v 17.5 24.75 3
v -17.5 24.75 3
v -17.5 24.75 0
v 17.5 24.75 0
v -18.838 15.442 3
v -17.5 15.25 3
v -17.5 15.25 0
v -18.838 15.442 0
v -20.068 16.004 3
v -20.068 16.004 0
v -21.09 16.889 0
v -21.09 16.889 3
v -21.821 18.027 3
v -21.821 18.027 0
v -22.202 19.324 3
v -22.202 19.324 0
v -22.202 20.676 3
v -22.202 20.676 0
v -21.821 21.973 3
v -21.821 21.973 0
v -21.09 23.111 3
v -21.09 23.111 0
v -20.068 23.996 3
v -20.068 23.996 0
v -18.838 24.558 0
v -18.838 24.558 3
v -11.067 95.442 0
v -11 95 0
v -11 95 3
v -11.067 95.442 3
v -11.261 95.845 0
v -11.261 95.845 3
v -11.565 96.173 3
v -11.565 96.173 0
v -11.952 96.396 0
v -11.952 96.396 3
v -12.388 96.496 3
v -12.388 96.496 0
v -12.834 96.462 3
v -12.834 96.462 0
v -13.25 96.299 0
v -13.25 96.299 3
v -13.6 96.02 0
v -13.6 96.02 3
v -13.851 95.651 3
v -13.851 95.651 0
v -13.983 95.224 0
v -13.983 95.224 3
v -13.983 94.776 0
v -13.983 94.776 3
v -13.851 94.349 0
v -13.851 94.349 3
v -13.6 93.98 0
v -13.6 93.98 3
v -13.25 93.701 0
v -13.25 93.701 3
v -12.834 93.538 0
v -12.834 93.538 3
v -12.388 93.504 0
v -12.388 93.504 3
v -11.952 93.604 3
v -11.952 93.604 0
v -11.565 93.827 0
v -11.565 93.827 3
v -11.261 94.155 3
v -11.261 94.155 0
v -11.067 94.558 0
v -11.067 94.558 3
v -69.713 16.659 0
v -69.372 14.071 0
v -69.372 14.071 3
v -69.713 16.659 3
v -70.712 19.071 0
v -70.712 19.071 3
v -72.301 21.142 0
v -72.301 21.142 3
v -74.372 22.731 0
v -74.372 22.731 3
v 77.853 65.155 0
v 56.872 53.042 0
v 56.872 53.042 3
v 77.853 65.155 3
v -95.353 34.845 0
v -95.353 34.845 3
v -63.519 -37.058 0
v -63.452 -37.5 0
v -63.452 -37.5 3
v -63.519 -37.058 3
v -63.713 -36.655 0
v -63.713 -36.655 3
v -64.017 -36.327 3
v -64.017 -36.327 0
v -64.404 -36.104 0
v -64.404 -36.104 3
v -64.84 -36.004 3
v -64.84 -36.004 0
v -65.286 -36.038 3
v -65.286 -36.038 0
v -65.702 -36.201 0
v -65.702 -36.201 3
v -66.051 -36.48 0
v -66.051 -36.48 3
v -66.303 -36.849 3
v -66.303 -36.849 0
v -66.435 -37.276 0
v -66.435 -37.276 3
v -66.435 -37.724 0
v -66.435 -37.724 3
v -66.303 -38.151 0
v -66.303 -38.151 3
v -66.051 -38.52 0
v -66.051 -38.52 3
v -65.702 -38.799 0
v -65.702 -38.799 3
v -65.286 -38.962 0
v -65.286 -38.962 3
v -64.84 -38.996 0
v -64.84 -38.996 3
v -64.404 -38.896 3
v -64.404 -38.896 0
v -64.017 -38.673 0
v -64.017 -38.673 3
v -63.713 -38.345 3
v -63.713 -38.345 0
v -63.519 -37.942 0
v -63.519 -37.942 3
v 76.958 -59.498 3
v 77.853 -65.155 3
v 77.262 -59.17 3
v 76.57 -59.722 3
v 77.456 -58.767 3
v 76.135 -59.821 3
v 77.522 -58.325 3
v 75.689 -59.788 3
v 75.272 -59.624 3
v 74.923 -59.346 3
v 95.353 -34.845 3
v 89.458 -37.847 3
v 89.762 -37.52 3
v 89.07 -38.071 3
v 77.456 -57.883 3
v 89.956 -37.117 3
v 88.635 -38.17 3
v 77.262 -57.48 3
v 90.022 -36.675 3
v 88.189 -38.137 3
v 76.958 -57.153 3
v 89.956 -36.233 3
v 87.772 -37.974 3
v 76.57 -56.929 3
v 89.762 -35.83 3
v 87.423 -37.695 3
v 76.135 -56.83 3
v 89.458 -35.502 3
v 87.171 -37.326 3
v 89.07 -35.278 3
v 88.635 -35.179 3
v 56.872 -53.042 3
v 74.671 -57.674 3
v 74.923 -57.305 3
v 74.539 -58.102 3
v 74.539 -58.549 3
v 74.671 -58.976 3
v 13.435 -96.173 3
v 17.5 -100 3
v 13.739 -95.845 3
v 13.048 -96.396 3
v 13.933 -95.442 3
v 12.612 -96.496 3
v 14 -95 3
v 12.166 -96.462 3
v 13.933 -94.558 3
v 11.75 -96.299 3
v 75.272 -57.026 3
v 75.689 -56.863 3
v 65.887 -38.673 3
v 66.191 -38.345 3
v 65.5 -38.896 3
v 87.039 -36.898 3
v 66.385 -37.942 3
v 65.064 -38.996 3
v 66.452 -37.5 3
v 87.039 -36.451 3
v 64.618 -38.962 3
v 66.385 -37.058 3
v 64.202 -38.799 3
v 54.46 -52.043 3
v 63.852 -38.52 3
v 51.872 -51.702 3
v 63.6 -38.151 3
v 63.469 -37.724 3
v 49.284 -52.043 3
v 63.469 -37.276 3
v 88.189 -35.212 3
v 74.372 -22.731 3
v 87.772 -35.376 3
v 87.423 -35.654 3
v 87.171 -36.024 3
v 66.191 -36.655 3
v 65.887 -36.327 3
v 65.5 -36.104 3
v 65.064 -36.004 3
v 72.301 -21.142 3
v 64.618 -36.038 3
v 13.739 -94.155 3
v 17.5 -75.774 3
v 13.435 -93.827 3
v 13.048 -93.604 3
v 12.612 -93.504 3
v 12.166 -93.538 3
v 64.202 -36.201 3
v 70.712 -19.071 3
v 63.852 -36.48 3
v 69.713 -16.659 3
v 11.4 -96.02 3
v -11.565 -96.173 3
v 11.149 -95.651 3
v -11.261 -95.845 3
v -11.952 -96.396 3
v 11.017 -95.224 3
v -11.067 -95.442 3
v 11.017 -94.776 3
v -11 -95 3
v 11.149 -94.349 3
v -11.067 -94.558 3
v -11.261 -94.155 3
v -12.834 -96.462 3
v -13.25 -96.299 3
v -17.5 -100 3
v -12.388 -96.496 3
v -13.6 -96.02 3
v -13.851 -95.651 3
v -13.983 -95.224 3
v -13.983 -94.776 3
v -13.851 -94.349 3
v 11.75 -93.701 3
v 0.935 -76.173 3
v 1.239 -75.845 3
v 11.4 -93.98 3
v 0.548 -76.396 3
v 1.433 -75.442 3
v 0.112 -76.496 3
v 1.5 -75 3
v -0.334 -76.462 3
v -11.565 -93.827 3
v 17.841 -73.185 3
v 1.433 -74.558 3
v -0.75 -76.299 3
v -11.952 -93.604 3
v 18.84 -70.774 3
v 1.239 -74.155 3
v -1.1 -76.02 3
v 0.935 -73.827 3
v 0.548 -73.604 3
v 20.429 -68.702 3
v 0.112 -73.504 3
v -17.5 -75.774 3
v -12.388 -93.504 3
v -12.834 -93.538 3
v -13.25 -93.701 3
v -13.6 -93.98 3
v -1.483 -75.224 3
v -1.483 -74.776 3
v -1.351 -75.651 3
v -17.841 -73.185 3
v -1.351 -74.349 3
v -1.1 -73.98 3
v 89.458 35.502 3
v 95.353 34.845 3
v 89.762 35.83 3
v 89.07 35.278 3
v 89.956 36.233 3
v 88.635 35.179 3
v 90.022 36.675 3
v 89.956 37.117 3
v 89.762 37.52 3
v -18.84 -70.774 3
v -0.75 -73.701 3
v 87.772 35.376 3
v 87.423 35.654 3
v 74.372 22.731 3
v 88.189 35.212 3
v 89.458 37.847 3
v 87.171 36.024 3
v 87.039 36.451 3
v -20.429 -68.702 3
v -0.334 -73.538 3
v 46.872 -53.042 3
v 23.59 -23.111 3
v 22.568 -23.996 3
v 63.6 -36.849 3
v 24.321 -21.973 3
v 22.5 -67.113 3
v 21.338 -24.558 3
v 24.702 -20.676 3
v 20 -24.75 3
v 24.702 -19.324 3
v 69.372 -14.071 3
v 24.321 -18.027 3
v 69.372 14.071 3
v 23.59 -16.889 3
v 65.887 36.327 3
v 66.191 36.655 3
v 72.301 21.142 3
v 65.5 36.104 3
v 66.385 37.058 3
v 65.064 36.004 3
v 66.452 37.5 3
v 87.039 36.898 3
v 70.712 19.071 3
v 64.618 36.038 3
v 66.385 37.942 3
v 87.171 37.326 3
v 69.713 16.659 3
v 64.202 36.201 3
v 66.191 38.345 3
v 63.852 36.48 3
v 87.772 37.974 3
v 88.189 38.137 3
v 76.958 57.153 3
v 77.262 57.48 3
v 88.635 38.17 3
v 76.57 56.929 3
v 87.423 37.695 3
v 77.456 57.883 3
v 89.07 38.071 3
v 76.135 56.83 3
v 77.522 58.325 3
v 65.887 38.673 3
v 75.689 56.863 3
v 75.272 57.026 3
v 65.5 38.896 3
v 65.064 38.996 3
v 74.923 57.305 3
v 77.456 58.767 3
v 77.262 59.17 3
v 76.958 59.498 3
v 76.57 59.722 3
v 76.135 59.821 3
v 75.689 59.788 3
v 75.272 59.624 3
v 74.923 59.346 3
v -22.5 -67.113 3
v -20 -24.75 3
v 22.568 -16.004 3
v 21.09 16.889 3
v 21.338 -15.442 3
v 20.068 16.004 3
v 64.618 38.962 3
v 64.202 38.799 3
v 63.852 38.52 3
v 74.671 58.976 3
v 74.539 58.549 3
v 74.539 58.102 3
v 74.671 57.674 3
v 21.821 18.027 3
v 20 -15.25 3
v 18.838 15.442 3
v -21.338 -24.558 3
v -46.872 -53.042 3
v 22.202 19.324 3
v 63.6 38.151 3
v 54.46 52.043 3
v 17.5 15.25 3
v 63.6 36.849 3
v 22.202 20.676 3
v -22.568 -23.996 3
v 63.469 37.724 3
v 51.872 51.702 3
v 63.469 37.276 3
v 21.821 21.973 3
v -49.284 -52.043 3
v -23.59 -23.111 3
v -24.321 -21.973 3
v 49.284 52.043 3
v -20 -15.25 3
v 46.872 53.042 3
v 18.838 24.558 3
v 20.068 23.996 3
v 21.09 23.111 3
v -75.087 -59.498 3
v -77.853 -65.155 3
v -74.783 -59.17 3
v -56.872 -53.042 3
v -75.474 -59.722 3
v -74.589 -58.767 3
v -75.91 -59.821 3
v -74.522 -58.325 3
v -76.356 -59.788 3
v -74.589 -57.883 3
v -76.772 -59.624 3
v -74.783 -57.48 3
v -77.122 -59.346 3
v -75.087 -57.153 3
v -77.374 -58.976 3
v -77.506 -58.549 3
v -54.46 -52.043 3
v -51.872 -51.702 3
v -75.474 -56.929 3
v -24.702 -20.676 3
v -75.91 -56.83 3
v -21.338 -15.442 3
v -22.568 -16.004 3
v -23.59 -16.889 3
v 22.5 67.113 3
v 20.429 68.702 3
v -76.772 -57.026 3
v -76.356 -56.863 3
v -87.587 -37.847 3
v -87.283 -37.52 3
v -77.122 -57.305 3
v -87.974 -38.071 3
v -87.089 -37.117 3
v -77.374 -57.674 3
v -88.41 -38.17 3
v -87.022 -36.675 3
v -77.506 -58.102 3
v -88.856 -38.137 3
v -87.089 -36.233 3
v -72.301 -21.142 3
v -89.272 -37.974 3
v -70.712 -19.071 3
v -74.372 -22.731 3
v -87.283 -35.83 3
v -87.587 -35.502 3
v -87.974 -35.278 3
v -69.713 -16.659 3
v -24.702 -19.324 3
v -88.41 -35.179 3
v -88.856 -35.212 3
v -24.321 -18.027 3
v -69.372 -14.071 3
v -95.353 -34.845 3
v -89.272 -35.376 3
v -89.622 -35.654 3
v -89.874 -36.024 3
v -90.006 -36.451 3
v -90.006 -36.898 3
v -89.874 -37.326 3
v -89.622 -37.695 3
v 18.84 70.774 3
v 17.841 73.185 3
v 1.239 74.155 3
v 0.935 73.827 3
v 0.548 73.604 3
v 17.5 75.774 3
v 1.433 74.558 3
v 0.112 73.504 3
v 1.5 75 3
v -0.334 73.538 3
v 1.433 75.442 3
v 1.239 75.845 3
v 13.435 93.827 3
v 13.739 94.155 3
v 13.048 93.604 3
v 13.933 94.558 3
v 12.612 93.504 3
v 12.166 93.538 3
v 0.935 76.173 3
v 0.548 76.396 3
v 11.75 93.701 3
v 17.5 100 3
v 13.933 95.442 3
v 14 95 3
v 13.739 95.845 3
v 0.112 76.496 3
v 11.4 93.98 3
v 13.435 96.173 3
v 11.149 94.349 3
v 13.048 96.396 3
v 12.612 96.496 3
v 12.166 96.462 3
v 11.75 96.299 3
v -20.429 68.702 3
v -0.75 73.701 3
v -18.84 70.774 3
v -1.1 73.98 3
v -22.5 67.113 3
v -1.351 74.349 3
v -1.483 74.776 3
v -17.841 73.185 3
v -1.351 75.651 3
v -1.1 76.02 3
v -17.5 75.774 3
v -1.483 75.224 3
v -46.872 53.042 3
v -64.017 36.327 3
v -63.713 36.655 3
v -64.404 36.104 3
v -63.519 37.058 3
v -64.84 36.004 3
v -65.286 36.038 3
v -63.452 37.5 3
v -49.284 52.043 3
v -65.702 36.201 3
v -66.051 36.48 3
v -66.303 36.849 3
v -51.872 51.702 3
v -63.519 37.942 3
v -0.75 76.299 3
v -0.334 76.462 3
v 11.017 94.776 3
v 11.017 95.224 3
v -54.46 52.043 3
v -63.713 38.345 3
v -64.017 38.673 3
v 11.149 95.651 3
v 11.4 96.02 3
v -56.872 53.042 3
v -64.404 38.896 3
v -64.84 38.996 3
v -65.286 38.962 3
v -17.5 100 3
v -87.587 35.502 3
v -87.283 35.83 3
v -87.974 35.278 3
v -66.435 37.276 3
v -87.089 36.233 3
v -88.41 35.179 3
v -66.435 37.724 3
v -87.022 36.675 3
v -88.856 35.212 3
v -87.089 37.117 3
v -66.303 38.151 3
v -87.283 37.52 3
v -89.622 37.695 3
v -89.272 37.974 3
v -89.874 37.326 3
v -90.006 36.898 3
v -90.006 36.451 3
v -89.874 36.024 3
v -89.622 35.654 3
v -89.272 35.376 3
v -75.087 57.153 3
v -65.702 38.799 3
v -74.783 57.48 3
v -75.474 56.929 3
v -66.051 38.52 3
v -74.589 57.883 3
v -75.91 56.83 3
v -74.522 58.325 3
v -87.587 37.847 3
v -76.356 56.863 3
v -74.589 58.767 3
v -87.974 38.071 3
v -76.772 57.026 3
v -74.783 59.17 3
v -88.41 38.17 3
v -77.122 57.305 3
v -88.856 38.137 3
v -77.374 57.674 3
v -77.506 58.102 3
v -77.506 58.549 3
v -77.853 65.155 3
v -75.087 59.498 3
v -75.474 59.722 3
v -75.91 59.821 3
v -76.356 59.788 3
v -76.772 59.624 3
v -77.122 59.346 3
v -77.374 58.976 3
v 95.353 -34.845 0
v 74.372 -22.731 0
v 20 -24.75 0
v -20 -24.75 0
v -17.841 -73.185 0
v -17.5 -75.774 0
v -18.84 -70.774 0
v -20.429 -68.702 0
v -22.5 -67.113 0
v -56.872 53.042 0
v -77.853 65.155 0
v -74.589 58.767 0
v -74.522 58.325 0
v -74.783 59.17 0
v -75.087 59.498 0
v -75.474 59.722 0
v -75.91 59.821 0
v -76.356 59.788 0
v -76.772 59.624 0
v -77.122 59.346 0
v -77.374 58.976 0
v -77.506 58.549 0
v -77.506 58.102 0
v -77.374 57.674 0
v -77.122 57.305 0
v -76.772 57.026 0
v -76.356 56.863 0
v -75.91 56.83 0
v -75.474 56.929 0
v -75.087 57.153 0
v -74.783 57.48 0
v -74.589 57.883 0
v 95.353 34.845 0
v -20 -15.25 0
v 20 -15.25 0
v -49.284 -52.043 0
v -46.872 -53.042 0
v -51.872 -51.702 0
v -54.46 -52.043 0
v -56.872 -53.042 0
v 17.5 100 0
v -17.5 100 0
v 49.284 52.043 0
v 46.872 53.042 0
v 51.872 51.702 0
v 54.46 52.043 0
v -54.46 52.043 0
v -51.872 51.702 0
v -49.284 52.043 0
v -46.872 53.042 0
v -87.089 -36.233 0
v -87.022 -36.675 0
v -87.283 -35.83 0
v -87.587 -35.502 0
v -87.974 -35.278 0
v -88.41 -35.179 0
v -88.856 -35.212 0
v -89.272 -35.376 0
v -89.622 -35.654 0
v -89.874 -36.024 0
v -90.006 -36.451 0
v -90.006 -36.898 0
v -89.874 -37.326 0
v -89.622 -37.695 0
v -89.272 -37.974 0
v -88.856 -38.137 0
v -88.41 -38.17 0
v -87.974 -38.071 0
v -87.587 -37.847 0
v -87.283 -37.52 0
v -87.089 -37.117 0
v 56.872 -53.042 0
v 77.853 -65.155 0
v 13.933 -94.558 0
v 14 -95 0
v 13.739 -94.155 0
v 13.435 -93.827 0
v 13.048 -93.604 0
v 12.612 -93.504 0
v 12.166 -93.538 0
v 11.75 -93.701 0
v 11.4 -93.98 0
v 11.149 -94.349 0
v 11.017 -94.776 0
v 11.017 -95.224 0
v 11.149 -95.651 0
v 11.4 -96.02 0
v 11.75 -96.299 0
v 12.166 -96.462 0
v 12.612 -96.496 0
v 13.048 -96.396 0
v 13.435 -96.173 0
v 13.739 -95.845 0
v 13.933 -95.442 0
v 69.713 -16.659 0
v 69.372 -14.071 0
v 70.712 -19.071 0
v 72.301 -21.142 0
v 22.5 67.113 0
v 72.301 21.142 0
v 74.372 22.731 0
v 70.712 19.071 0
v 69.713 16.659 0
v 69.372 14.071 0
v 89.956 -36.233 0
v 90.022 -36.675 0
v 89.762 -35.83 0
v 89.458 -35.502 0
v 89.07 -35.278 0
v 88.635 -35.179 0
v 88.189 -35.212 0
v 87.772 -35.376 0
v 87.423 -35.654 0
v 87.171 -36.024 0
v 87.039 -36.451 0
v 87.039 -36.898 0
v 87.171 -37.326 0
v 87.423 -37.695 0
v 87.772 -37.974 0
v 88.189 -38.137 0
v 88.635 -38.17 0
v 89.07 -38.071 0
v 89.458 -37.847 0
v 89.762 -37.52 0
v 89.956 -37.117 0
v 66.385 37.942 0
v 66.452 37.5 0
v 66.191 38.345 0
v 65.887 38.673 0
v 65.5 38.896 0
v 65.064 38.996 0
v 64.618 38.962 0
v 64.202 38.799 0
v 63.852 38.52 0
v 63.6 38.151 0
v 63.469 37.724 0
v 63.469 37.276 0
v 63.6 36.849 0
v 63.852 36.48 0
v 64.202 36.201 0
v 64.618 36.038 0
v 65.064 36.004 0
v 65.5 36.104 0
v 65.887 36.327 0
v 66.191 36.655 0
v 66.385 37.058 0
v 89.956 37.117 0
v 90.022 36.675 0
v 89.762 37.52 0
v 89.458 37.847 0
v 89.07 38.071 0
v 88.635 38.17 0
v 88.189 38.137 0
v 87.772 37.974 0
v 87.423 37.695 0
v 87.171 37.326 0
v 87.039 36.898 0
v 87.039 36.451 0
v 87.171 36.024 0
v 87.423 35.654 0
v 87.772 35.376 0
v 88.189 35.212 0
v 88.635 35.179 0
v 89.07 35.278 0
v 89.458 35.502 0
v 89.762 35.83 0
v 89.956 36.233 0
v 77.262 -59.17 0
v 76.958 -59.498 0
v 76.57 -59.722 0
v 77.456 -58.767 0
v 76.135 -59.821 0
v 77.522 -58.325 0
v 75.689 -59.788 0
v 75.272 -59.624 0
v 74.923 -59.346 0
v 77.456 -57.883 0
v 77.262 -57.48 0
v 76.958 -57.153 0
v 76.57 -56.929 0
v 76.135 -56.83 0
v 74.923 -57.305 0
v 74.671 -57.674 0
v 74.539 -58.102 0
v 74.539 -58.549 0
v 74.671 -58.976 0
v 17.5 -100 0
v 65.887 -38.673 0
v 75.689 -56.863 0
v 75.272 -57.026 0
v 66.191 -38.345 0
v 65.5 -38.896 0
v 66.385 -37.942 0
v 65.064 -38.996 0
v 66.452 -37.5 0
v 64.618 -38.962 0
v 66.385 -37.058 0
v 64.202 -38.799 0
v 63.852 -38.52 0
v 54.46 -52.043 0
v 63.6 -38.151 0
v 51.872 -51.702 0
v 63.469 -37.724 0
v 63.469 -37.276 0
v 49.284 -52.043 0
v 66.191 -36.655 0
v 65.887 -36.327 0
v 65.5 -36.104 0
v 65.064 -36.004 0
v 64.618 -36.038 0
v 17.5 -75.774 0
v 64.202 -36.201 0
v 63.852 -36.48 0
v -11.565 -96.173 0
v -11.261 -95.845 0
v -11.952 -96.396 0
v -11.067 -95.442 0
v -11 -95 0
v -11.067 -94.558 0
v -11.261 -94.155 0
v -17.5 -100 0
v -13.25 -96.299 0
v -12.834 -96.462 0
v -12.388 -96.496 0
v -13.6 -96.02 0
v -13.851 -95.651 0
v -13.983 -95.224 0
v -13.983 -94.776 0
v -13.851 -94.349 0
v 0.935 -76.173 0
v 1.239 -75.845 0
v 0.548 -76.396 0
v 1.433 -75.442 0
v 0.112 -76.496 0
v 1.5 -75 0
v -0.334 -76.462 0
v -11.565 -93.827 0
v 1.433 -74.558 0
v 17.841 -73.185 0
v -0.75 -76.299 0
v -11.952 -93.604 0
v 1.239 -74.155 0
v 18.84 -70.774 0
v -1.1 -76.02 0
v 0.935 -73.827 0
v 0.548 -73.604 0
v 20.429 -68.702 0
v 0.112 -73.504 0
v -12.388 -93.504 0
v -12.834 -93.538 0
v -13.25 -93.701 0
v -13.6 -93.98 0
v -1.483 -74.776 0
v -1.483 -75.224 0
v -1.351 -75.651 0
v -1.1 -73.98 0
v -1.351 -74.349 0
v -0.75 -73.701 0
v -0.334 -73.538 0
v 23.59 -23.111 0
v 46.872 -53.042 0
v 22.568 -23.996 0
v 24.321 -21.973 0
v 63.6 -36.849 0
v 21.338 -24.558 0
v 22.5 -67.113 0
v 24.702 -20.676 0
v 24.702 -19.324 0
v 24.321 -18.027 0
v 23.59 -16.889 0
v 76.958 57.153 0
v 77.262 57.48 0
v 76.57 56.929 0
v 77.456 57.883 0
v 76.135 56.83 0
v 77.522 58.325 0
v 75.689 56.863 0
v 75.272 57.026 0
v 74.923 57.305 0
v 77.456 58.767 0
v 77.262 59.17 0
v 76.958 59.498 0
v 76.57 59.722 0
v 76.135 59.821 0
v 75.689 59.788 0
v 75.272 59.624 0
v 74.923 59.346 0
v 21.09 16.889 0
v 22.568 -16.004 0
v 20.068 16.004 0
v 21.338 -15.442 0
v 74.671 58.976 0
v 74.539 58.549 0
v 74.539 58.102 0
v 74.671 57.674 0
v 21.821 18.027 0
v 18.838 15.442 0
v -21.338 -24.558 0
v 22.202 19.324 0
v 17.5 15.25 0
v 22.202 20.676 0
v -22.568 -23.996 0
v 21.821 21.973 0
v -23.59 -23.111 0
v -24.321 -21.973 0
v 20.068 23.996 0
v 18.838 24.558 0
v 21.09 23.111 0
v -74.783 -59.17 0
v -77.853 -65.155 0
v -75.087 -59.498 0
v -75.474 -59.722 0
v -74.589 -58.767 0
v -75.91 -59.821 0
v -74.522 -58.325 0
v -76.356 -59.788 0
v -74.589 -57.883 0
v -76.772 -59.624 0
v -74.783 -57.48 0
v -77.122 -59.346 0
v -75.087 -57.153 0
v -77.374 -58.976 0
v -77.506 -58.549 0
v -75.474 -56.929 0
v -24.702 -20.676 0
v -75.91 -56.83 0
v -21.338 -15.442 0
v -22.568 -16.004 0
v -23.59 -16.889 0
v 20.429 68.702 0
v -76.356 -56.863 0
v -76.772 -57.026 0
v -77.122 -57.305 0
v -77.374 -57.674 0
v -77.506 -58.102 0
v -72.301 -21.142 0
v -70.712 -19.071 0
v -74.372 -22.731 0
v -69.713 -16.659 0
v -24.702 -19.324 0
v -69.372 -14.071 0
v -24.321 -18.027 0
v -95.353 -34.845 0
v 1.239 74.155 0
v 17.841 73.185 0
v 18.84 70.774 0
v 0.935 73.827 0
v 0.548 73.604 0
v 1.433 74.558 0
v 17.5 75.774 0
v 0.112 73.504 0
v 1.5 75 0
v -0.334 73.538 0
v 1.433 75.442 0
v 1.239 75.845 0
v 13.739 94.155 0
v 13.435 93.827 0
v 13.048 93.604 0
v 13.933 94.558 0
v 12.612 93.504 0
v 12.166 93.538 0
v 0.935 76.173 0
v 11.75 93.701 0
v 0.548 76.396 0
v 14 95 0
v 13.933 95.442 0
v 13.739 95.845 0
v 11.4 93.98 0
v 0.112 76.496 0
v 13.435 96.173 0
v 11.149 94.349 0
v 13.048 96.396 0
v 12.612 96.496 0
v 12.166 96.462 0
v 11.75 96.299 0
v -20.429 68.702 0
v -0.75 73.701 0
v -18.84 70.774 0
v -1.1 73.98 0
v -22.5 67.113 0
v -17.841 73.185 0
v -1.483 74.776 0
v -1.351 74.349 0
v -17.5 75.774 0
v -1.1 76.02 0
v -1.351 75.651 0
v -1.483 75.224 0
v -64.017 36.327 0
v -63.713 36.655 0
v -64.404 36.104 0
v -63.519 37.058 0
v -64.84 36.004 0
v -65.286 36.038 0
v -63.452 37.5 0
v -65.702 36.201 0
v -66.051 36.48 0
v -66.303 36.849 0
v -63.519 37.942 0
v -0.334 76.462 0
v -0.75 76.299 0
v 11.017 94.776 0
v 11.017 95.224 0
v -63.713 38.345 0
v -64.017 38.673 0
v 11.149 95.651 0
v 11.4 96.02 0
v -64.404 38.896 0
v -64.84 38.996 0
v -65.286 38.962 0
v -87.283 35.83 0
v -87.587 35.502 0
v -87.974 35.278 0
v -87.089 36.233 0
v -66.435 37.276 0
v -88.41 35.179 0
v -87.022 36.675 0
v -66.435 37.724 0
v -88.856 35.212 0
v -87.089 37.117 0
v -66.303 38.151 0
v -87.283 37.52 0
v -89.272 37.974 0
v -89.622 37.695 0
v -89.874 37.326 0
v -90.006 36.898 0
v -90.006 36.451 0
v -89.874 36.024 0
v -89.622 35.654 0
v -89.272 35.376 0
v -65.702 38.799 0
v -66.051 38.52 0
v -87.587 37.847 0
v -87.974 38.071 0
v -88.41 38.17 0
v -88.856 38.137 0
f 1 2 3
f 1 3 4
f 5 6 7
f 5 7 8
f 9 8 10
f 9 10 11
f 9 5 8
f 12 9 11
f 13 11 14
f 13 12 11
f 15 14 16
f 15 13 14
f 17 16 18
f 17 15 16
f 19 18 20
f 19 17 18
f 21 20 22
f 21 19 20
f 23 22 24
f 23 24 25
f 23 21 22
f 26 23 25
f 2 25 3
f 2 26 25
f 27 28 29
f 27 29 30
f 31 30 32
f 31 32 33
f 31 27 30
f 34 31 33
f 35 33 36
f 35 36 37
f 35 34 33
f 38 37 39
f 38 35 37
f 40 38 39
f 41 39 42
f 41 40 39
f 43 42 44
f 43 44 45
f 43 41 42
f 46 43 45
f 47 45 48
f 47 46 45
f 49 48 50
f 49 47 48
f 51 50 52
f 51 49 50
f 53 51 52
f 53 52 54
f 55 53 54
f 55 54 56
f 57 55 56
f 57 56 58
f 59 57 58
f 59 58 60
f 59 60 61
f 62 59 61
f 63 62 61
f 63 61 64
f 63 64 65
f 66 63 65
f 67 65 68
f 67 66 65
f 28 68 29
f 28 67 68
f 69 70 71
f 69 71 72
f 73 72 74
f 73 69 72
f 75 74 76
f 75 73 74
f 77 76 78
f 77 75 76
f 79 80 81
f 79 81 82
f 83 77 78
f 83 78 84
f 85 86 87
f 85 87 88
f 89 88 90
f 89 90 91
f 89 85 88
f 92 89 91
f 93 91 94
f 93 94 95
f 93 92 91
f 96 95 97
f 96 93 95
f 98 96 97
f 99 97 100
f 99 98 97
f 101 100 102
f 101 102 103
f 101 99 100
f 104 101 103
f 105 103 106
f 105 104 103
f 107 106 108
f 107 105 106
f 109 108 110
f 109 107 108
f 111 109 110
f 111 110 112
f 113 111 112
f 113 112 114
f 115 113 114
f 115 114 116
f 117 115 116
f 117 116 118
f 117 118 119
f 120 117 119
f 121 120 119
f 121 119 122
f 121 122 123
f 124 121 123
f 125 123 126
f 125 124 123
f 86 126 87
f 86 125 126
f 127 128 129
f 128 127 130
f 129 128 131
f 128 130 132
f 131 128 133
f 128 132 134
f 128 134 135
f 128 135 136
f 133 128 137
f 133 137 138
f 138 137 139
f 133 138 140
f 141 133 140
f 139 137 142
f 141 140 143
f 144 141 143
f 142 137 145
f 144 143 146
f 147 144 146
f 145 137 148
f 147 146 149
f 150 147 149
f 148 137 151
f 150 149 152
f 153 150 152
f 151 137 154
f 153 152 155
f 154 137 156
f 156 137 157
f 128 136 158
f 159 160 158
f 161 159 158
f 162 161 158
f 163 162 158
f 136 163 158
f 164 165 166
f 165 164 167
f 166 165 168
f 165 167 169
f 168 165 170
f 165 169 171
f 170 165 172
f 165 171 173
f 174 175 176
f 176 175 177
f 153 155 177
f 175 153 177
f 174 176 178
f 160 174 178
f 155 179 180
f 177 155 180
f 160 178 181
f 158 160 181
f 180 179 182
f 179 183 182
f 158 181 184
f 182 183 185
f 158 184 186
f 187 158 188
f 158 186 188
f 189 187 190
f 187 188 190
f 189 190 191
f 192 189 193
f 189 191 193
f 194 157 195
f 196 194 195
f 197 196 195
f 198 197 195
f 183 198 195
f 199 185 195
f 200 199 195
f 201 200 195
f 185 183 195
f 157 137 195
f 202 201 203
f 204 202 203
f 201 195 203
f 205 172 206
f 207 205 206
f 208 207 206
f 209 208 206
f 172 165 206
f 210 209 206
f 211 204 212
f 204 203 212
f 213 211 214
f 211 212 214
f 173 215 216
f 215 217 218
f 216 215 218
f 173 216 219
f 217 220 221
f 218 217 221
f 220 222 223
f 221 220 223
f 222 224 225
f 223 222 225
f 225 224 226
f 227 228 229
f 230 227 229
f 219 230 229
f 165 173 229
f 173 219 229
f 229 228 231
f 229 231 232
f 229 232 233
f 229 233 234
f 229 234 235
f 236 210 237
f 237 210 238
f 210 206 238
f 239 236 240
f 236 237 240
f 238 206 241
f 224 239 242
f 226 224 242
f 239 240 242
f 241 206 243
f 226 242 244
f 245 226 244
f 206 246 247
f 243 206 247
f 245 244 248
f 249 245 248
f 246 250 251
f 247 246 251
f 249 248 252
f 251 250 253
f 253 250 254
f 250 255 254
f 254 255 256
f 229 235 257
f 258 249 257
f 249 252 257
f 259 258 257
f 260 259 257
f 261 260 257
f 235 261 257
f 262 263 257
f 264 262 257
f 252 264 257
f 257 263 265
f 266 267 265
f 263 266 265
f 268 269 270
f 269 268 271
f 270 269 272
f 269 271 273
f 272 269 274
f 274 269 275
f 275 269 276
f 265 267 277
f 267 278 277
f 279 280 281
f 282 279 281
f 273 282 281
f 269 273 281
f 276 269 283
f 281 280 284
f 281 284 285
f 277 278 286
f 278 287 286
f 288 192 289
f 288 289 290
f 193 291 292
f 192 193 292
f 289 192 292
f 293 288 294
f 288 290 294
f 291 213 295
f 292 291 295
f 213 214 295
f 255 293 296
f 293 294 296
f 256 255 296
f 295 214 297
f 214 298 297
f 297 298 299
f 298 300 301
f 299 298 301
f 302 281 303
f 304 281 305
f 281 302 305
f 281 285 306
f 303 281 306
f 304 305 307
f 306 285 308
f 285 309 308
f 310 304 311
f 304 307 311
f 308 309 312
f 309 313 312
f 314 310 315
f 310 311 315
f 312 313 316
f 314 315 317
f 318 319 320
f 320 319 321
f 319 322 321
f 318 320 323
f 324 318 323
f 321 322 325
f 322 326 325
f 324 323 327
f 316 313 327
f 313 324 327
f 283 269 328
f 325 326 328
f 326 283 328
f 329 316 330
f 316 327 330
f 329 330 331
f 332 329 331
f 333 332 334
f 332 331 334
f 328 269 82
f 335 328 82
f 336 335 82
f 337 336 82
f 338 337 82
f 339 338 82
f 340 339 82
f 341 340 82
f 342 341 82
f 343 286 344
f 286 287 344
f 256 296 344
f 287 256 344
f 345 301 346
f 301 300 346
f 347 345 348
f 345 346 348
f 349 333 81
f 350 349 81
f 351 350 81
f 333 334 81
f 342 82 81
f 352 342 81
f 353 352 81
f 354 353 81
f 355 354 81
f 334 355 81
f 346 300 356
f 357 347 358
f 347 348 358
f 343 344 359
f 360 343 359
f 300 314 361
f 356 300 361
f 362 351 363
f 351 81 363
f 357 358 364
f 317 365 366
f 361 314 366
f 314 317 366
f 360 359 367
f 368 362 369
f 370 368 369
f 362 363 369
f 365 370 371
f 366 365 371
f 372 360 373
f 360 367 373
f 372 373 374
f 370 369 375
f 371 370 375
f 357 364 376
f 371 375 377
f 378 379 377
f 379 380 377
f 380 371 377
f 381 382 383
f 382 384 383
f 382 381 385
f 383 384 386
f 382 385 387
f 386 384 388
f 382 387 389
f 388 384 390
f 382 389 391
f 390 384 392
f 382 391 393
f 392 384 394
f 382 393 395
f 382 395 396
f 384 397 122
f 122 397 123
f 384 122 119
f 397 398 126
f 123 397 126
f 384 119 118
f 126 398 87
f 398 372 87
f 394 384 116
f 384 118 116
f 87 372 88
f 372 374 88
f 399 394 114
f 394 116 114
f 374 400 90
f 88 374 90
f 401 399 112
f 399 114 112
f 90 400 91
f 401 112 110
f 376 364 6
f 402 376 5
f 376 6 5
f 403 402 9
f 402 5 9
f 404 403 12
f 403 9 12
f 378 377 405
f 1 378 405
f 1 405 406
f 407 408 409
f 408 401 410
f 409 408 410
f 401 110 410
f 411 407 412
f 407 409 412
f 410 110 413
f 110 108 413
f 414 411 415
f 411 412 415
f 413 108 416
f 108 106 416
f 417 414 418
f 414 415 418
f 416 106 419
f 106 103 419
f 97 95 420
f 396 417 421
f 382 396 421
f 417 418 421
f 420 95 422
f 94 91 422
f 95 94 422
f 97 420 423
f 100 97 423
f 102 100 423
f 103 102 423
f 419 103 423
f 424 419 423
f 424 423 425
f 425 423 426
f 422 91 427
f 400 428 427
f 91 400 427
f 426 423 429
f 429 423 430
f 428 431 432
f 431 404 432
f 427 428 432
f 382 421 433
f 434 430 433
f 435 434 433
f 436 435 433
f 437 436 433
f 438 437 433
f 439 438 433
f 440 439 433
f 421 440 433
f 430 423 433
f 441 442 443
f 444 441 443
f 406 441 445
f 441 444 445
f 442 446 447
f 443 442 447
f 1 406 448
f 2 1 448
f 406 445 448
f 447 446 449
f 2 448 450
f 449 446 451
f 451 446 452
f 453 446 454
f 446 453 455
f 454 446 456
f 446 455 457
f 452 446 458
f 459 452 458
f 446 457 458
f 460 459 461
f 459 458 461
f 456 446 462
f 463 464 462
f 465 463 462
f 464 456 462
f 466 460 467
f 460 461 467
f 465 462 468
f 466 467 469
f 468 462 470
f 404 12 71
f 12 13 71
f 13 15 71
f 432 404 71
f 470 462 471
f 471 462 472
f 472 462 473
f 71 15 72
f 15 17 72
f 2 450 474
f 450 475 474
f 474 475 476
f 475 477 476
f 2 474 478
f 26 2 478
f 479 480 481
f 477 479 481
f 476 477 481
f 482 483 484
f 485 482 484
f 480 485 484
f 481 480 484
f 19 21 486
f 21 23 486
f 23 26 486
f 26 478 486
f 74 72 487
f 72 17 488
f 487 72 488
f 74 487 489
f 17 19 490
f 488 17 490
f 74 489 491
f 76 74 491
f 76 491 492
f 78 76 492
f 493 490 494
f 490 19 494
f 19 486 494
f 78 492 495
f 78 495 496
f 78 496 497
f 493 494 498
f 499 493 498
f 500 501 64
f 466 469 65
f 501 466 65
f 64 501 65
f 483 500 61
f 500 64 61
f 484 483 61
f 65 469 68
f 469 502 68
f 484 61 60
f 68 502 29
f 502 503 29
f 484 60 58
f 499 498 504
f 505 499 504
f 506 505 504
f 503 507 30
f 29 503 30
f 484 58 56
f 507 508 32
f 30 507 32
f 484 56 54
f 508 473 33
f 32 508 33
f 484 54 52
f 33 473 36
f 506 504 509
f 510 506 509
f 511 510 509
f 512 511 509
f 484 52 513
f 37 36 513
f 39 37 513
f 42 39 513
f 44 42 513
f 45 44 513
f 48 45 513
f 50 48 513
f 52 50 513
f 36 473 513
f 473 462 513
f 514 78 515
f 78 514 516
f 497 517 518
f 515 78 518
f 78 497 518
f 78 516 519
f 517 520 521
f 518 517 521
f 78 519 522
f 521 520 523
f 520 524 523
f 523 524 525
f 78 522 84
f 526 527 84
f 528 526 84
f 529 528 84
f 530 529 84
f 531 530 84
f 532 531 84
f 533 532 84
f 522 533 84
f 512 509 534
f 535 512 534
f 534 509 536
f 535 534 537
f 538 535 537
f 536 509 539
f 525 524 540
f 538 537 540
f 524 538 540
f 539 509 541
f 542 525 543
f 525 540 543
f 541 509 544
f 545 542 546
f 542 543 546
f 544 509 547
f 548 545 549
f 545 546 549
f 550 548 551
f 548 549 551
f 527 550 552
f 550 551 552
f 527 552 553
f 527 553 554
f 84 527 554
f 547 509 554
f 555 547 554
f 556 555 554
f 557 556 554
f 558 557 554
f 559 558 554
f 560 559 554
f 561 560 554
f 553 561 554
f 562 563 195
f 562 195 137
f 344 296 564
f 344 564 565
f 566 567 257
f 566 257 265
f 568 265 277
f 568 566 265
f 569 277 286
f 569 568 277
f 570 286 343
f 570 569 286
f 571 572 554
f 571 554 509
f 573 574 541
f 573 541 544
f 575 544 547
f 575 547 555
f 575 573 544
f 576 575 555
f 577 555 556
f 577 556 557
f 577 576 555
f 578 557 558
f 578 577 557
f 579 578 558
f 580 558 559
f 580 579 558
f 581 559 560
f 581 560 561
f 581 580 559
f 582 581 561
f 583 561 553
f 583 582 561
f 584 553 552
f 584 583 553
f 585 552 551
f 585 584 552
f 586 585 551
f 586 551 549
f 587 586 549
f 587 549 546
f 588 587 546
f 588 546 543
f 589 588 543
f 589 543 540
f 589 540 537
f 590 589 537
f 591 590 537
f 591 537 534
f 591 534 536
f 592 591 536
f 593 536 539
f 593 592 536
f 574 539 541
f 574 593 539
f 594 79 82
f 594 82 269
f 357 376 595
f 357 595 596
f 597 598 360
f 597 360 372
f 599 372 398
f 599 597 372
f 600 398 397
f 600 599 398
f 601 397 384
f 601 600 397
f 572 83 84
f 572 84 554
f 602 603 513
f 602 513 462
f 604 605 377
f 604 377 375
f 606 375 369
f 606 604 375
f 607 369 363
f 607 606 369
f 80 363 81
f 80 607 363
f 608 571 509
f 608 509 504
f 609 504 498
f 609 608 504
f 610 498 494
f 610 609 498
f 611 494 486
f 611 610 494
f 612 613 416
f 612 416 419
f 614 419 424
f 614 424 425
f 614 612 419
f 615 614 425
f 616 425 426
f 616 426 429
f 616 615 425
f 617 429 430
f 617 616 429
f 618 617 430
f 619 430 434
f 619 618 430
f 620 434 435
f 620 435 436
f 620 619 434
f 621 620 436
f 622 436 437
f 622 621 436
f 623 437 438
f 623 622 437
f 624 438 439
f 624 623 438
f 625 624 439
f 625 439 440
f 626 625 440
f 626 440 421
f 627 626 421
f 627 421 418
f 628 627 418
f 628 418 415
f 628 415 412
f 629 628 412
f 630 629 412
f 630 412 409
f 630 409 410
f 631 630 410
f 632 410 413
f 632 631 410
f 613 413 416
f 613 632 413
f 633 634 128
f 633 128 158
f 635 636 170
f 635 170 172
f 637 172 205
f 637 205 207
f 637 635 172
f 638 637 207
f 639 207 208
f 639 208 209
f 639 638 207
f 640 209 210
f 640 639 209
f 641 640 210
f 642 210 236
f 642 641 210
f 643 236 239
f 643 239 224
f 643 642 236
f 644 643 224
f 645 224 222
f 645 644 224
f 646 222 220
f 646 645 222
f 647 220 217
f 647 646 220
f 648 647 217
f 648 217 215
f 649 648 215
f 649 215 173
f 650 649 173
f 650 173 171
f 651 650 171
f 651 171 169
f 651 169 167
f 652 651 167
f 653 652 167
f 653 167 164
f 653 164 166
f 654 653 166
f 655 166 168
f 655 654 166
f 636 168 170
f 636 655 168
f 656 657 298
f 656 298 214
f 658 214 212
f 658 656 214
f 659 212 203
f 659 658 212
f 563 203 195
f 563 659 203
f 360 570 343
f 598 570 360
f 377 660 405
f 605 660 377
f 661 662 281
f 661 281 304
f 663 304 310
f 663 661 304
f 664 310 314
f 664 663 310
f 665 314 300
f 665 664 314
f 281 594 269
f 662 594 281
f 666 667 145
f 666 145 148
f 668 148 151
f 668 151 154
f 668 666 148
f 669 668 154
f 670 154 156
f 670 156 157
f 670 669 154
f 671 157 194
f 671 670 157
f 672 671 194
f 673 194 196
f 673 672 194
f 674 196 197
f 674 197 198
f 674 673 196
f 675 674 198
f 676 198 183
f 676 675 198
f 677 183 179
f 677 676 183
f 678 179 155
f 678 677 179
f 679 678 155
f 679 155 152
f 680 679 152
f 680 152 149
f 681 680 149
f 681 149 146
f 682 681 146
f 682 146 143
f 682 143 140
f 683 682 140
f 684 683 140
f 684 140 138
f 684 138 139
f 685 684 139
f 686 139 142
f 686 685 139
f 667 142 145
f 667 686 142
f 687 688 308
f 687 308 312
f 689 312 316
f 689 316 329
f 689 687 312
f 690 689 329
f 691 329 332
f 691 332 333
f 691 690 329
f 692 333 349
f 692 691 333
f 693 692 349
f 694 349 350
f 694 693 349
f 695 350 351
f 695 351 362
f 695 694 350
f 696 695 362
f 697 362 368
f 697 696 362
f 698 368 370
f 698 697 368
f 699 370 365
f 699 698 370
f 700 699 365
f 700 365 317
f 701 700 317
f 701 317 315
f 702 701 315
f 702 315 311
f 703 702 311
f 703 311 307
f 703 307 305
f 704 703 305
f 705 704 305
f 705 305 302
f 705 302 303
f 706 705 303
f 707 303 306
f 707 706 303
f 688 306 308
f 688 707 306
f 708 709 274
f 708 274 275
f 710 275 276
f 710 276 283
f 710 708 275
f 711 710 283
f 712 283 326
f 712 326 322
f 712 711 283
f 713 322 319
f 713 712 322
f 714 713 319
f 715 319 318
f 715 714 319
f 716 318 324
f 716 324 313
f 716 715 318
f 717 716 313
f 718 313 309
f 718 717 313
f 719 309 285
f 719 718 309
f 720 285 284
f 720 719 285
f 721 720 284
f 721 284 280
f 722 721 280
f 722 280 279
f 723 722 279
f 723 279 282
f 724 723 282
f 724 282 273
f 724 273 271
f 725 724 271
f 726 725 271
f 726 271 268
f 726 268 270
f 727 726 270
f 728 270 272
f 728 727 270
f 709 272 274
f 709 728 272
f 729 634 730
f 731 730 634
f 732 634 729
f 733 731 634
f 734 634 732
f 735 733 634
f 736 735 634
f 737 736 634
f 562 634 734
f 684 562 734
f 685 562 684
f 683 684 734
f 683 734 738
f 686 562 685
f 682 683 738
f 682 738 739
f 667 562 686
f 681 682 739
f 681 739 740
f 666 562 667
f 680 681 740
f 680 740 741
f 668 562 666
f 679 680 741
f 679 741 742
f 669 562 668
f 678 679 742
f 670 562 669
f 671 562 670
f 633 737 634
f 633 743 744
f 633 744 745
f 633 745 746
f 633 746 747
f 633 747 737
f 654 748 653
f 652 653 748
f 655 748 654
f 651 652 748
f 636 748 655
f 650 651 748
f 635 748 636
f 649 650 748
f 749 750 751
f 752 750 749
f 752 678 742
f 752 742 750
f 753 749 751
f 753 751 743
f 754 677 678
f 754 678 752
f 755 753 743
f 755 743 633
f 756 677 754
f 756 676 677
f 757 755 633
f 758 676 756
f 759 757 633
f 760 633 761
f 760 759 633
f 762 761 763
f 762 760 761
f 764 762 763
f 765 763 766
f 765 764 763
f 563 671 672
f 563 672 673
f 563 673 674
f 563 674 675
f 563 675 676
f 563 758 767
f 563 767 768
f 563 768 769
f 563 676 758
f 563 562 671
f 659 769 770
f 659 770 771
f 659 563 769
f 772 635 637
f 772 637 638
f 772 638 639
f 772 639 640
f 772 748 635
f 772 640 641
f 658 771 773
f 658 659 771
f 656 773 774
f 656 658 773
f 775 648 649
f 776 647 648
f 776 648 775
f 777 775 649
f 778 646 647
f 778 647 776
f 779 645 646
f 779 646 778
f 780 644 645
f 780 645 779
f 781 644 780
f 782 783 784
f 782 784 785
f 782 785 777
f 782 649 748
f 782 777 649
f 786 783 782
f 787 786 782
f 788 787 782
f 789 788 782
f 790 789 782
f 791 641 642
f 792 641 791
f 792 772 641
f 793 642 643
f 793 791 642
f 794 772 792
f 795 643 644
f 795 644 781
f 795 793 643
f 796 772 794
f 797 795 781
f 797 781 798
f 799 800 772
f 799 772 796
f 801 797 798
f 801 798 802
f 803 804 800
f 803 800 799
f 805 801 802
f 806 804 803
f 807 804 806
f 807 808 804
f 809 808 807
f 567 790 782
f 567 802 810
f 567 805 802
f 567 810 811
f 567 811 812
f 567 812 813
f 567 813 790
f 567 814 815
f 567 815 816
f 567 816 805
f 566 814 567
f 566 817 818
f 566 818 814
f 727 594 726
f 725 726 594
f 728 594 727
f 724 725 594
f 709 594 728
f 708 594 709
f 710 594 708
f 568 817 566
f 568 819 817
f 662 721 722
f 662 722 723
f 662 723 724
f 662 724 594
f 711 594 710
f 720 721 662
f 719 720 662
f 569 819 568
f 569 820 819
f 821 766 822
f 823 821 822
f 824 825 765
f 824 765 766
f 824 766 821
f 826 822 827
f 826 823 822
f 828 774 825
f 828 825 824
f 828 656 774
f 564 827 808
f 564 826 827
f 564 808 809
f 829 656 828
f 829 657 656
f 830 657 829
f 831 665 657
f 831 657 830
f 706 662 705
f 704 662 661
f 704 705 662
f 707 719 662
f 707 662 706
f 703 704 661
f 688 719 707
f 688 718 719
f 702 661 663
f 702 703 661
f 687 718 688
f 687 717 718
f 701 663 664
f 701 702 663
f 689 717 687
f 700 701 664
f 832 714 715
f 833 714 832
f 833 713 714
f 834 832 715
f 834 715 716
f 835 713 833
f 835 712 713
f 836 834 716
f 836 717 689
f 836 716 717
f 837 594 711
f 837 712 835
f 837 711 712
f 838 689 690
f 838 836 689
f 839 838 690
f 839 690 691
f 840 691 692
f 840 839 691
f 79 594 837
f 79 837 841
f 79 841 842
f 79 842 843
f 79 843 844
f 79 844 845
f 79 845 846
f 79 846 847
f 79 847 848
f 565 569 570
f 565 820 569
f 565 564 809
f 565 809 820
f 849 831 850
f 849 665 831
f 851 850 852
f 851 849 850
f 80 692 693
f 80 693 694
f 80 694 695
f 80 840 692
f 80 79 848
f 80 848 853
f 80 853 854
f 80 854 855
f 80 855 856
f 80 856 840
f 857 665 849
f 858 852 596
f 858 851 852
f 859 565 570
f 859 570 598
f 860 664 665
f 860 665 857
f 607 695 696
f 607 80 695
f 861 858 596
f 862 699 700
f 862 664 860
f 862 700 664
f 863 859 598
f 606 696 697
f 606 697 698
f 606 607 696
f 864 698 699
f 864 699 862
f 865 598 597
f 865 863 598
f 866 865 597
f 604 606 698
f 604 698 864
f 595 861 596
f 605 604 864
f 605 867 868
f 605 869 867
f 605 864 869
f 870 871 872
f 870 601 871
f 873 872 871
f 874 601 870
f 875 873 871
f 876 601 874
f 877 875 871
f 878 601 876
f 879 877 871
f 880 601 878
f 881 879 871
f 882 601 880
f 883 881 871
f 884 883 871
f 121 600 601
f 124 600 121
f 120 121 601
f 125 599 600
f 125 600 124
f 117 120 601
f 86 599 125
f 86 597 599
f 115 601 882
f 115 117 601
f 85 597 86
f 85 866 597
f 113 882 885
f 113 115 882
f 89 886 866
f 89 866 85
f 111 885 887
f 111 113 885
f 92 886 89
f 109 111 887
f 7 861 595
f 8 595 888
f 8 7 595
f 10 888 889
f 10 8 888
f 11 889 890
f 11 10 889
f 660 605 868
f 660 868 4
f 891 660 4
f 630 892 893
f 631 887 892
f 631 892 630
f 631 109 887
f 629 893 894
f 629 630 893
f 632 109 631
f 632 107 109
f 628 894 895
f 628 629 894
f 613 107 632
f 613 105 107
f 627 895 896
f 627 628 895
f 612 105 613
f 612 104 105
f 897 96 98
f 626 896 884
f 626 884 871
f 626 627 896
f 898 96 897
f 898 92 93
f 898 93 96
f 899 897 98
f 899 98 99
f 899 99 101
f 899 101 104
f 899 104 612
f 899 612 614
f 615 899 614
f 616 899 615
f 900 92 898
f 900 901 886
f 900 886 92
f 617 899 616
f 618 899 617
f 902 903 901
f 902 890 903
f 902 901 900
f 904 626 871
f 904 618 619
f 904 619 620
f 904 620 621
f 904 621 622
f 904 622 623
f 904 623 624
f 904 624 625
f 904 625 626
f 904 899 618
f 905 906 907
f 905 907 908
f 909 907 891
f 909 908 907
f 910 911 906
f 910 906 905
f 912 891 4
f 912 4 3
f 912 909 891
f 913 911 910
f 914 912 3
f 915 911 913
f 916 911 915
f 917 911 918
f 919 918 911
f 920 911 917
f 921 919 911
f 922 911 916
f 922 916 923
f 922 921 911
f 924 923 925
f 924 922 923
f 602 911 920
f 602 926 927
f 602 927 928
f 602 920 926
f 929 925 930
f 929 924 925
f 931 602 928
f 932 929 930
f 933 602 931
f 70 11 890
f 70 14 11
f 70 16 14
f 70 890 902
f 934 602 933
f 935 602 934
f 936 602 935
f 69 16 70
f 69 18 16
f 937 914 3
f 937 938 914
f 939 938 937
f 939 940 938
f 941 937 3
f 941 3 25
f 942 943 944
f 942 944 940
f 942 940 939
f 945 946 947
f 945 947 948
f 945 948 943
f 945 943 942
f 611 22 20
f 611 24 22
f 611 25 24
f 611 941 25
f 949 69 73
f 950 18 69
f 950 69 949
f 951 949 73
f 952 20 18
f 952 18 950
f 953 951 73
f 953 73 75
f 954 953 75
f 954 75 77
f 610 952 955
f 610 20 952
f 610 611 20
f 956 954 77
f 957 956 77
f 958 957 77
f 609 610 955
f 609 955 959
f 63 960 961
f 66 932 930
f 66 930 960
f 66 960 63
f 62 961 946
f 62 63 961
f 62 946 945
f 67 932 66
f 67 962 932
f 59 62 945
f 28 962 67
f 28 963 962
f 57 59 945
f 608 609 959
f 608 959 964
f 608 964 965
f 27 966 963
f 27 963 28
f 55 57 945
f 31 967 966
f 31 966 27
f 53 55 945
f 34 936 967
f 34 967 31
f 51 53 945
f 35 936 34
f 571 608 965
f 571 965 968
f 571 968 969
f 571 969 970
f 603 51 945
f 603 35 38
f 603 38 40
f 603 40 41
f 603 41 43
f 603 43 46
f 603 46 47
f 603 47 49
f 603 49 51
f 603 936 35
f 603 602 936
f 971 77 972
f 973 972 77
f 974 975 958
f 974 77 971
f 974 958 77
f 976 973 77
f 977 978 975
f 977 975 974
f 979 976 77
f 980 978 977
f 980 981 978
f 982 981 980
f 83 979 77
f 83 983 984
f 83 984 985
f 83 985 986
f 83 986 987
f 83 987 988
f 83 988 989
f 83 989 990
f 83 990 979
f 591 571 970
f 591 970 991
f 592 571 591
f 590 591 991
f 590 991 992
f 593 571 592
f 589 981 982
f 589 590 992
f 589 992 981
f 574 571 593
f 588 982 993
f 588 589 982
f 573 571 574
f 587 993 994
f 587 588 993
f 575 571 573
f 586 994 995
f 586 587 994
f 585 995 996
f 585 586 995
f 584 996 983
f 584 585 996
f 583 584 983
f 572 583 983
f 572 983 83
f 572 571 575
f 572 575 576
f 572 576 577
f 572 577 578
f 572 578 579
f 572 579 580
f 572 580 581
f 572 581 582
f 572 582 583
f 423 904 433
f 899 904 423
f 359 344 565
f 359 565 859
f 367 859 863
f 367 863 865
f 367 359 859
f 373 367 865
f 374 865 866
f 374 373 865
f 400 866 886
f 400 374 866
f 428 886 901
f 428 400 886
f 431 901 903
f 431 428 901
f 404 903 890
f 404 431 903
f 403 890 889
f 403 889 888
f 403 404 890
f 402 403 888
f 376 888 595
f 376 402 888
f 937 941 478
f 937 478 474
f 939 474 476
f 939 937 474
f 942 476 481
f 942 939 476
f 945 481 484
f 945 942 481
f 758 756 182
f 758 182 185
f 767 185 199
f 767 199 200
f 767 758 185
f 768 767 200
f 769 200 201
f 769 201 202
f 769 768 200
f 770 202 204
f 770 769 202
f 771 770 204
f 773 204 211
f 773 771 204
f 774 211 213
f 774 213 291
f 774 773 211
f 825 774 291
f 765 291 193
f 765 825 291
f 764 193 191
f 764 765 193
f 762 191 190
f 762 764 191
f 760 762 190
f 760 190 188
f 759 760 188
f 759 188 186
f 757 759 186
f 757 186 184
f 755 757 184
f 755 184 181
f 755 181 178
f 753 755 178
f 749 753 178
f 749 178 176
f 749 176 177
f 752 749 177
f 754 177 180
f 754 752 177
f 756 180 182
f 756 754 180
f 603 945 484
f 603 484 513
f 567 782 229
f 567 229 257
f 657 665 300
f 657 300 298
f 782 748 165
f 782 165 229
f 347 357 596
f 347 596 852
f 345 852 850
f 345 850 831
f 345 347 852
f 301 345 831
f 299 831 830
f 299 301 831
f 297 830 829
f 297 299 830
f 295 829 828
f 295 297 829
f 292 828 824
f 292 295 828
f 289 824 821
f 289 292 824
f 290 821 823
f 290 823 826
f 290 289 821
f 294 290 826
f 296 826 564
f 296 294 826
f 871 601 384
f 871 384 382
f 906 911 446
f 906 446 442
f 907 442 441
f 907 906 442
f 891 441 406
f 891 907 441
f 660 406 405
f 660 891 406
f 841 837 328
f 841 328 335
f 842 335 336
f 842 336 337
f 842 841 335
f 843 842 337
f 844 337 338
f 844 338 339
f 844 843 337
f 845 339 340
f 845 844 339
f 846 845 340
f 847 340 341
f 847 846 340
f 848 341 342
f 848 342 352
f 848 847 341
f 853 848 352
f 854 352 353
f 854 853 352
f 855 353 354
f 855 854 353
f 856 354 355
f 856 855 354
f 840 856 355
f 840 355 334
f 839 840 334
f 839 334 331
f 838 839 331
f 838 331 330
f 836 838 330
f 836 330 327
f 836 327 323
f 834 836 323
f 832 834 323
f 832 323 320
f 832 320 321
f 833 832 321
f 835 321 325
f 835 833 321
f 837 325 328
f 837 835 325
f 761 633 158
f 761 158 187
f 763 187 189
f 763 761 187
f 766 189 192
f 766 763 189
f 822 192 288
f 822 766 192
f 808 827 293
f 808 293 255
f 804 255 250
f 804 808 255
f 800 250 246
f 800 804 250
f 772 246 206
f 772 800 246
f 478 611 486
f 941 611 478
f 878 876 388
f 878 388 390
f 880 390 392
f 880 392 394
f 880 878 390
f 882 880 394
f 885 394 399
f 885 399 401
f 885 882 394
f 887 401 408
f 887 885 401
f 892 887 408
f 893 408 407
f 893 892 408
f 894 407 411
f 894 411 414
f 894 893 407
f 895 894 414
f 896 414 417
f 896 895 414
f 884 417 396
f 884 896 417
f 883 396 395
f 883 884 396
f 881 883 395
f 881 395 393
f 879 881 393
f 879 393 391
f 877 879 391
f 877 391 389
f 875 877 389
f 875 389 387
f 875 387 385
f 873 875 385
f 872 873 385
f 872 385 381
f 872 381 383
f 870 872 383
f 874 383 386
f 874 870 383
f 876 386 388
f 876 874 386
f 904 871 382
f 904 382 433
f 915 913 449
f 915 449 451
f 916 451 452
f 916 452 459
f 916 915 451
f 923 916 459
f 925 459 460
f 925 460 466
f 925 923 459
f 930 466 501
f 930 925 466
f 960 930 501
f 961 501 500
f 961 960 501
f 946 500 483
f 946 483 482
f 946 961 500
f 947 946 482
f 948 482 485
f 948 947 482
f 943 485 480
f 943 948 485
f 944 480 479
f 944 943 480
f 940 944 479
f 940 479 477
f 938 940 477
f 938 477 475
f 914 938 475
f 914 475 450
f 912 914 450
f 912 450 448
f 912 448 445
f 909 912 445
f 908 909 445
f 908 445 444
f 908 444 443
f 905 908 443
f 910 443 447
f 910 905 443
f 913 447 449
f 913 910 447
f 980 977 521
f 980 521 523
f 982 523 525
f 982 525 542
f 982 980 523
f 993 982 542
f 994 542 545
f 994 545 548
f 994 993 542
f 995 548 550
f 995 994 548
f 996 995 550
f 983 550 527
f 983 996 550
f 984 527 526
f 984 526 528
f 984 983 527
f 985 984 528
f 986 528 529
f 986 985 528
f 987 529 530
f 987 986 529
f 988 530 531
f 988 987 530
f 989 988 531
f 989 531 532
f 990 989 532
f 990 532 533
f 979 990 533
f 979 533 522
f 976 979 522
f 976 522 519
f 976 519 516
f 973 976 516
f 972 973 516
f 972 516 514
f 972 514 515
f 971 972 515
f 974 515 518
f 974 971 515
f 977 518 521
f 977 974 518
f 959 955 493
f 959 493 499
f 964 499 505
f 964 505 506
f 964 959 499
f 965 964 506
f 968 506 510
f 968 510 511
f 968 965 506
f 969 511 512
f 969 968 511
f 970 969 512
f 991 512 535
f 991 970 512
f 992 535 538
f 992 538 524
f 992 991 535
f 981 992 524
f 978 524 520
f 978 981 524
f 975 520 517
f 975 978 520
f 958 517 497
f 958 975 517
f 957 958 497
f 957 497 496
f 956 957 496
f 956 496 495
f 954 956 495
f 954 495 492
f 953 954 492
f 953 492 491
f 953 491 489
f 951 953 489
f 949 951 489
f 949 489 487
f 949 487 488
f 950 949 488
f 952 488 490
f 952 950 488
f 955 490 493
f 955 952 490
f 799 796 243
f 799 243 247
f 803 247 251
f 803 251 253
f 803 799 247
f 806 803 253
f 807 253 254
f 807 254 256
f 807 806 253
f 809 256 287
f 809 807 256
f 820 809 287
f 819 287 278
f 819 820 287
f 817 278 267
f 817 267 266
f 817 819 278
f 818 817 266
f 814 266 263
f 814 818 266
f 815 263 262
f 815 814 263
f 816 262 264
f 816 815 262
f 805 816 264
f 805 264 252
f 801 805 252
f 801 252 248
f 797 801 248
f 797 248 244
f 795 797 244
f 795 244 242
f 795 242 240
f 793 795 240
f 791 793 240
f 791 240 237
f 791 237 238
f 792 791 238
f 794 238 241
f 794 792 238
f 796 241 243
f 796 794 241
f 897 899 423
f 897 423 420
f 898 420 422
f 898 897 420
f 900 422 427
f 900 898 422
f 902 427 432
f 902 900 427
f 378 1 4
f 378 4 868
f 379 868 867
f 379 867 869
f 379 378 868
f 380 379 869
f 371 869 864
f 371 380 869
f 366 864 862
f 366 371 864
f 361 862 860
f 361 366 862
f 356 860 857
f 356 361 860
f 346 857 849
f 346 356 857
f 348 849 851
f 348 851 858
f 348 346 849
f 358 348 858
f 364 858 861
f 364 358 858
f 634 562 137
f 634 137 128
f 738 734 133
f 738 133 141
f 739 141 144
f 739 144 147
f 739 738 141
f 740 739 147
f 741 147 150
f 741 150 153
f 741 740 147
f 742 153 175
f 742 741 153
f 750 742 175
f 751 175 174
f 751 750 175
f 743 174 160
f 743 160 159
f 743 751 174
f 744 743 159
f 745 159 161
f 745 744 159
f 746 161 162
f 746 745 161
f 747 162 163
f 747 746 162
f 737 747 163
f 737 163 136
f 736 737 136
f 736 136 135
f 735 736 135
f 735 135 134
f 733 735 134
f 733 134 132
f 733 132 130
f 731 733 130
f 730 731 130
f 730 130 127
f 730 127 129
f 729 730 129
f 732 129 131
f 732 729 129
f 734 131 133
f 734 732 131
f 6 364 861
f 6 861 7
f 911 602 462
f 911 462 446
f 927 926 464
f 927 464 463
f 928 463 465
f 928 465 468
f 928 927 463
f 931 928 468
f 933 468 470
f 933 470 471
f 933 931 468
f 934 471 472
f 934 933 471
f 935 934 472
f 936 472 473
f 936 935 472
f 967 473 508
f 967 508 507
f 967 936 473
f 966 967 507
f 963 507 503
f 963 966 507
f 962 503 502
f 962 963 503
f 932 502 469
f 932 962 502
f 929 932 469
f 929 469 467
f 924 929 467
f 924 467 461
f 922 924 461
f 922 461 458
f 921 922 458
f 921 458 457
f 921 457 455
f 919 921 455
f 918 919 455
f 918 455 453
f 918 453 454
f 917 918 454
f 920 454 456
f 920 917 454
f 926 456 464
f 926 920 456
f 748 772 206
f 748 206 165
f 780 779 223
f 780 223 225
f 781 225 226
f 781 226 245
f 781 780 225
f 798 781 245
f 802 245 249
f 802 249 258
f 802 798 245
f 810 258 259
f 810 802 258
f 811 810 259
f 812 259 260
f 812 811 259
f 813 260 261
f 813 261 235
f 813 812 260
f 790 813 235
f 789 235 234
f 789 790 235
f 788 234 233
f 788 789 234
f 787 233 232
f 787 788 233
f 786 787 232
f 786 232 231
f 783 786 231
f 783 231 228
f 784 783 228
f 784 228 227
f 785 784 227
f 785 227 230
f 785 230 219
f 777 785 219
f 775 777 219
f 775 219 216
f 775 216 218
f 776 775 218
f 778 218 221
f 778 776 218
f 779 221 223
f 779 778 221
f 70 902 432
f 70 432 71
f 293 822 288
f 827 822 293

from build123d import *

# Parameters (mm, degrees)
IZIM1_R                     = 1.5
Y_KSEKLIK_EKSTR_ZYON1_DEPTH = 3
KES_EKSTR_ZYON2_DEPTH       = 3


with BuildPart() as part:
    # Çizim1 → Yükseklik-Ekstrüzyon1 (new body)
    with BuildSketch(Plane.XY):
        with BuildLine():
            Line((-17.5, 100), (17.5, 100))
            Line((17.5, 100), (17.5, 75.773502692))
            ThreePointArc((17.5, 75.773502692), (18.839745962, 70.773502692), (22.5, 67.113248654))
            Line((22.5, 67.113248654), (46.871778265, 53.042195912))
            ThreePointArc((46.871778265, 53.042195912), (51.871778265, 51.70244995), (56.871778265, 53.042195912))
            Line((56.871778265, 53.042195912), (77.852540378, 65.155444566))
            Line((77.852540378, 65.155444566), (95.352540378, 34.844555434))
            Line((95.352540378, 34.844555434), (74.371778265, 22.73130678))
            ThreePointArc((74.371778265, 22.73130678), (70.711524227, 19.071052742), (69.371778265, 14.071052742))
            Line((69.371778265, 14.071052742), (69.371778265, -14.071052742))
            ThreePointArc((69.371778265, -14.071052742), (70.711524227, -19.071052742), (74.371778265, -22.73130678))
            Line((74.371778265, -22.73130678), (95.352540378, -34.844555434))
            Line((95.352540378, -34.844555434), (77.852540378, -65.155444566))
            Line((77.852540378, -65.155444566), (56.871778265, -53.042195912))
            ThreePointArc((56.871778265, -53.042195912), (51.871778265, -51.70244995), (46.871778265, -53.042195912))
            Line((46.871778265, -53.042195912), (22.5, -67.113248654))
            ThreePointArc((22.5, -67.113248654), (18.839745962, -70.773502692), (17.5, -75.773502692))
            Line((17.5, -75.773502692), (17.5, -100))
            Line((17.5, -100), (-17.5, -100))
            Line((-17.5, -100), (-17.5, -75.773502692))
            ThreePointArc((-17.5, -75.773502692), (-18.839745962, -70.773502692), (-22.5, -67.113248654))
            Line((-22.5, -67.113248654), (-46.871778265, -53.042195912))
            ThreePointArc((-46.871778265, -53.042195912), (-51.871778265, -51.70244995), (-56.871778265, -53.042195912))
            Line((-56.871778265, -53.042195912), (-77.852540379, -65.155444566))
            Line((-77.852540379, -65.155444566), (-95.352540379, -34.844555434))
            Line((-95.352540379, -34.844555434), (-74.371778265, -22.73130678))
            ThreePointArc((-74.371778265, -22.73130678), (-70.711524227, -19.071052742), (-69.371778265, -14.071052742))
            Line((-69.371778265, -14.071052742), (-69.371778265, 14.071052742))
            ThreePointArc((-69.371778265, 14.071052742), (-70.711524227, 19.071052742), (-74.371778265, 22.73130678))
            Line((-74.371778265, 22.73130678), (-95.352540378, 34.844555434))
            Line((-95.352540378, 34.844555434), (-77.852540378, 65.155444566))
            Line((-77.852540378, 65.155444566), (-56.871778265, 53.042195912))
            ThreePointArc((-56.871778265, 53.042195912), (-51.871778265, 51.70244995), (-46.871778265, 53.042195912))
            Line((-46.871778265, 53.042195912), (-22.5, 67.113248654))
            ThreePointArc((-22.5, 67.113248654), (-18.839745962, 70.773502692), (-17.5, 75.773502692))
            Line((-17.5, 75.773502692), (-17.5, 100))
        make_face()
        with Locations((-12.5, 95)):
            Circle(IZIM1_R, mode=Mode.SUBTRACT)
        with Locations((12.5, 95)):
            Circle(IZIM1_R, mode=Mode.SUBTRACT)
        with Locations((0, 75)):
            Circle(IZIM1_R, mode=Mode.SUBTRACT)
        with Locations((76.022413359, 58.325317547)):
            Circle(IZIM1_R, mode=Mode.SUBTRACT)
        with Locations((88.522413359, 36.674682453)):
            Circle(IZIM1_R, mode=Mode.SUBTRACT)
        with Locations((64.951905284, 37.5)):
            Circle(IZIM1_R, mode=Mode.SUBTRACT)
        with Locations((88.522413359, -36.674682453)):
            Circle(IZIM1_R, mode=Mode.SUBTRACT)
        with Locations((76.02241336, -58.325317547)):
            Circle(IZIM1_R, mode=Mode.SUBTRACT)
        with Locations((64.951905284, -37.5)):
            Circle(IZIM1_R, mode=Mode.SUBTRACT)
        with Locations((12.5, -95)):
            Circle(IZIM1_R, mode=Mode.SUBTRACT)
        with Locations((-12.5, -95)):
            Circle(IZIM1_R, mode=Mode.SUBTRACT)
        with Locations((0, -75)):
            Circle(IZIM1_R, mode=Mode.SUBTRACT)
        with Locations((-76.022413359, -58.325317547)):
            Circle(IZIM1_R, mode=Mode.SUBTRACT)
        with Locations((-88.522413359, -36.674682453)):
            Circle(IZIM1_R, mode=Mode.SUBTRACT)
        with Locations((-64.951905284, -37.5)):
            Circle(IZIM1_R, mode=Mode.SUBTRACT)
        with Locations((-88.522413359, 36.674682453)):
            Circle(IZIM1_R, mode=Mode.SUBTRACT)
        with Locations((-76.022413359, 58.325317547)):
            Circle(IZIM1_R, mode=Mode.SUBTRACT)
        with Locations((-64.951905284, 37.5)):
            Circle(IZIM1_R, mode=Mode.SUBTRACT)
    extrude(amount=Y_KSEKLIK_EKSTR_ZYON1_DEPTH)

    # Çizim2 → Kes-Ekstrüzyon2 (cut)
    with BuildSketch(Plane.XY.offset(3)):
        with BuildLine():
            Line((-17.5, 24.75), (17.5, 24.75))
            ThreePointArc((17.5, 24.75), (22.25, 20), (17.5, 15.25))
            Line((17.5, 15.25), (-17.5, 15.25))
            ThreePointArc((-17.5, 15.25), (-22.25, 20), (-17.5, 24.75))
        make_face()
        with BuildLine():
            Line((-20, -15.25), (20, -15.25))
            ThreePointArc((20, -15.25), (24.75, -20), (20, -24.75))
            Line((20, -24.75), (-20, -24.75))
            ThreePointArc((-20, -24.75), (-24.75, -20), (-20, -15.25))
        make_face()
    extrude(amount=-KES_EKSTR_ZYON2_DEPTH, mode=Mode.SUBTRACT)


solid = part.part
